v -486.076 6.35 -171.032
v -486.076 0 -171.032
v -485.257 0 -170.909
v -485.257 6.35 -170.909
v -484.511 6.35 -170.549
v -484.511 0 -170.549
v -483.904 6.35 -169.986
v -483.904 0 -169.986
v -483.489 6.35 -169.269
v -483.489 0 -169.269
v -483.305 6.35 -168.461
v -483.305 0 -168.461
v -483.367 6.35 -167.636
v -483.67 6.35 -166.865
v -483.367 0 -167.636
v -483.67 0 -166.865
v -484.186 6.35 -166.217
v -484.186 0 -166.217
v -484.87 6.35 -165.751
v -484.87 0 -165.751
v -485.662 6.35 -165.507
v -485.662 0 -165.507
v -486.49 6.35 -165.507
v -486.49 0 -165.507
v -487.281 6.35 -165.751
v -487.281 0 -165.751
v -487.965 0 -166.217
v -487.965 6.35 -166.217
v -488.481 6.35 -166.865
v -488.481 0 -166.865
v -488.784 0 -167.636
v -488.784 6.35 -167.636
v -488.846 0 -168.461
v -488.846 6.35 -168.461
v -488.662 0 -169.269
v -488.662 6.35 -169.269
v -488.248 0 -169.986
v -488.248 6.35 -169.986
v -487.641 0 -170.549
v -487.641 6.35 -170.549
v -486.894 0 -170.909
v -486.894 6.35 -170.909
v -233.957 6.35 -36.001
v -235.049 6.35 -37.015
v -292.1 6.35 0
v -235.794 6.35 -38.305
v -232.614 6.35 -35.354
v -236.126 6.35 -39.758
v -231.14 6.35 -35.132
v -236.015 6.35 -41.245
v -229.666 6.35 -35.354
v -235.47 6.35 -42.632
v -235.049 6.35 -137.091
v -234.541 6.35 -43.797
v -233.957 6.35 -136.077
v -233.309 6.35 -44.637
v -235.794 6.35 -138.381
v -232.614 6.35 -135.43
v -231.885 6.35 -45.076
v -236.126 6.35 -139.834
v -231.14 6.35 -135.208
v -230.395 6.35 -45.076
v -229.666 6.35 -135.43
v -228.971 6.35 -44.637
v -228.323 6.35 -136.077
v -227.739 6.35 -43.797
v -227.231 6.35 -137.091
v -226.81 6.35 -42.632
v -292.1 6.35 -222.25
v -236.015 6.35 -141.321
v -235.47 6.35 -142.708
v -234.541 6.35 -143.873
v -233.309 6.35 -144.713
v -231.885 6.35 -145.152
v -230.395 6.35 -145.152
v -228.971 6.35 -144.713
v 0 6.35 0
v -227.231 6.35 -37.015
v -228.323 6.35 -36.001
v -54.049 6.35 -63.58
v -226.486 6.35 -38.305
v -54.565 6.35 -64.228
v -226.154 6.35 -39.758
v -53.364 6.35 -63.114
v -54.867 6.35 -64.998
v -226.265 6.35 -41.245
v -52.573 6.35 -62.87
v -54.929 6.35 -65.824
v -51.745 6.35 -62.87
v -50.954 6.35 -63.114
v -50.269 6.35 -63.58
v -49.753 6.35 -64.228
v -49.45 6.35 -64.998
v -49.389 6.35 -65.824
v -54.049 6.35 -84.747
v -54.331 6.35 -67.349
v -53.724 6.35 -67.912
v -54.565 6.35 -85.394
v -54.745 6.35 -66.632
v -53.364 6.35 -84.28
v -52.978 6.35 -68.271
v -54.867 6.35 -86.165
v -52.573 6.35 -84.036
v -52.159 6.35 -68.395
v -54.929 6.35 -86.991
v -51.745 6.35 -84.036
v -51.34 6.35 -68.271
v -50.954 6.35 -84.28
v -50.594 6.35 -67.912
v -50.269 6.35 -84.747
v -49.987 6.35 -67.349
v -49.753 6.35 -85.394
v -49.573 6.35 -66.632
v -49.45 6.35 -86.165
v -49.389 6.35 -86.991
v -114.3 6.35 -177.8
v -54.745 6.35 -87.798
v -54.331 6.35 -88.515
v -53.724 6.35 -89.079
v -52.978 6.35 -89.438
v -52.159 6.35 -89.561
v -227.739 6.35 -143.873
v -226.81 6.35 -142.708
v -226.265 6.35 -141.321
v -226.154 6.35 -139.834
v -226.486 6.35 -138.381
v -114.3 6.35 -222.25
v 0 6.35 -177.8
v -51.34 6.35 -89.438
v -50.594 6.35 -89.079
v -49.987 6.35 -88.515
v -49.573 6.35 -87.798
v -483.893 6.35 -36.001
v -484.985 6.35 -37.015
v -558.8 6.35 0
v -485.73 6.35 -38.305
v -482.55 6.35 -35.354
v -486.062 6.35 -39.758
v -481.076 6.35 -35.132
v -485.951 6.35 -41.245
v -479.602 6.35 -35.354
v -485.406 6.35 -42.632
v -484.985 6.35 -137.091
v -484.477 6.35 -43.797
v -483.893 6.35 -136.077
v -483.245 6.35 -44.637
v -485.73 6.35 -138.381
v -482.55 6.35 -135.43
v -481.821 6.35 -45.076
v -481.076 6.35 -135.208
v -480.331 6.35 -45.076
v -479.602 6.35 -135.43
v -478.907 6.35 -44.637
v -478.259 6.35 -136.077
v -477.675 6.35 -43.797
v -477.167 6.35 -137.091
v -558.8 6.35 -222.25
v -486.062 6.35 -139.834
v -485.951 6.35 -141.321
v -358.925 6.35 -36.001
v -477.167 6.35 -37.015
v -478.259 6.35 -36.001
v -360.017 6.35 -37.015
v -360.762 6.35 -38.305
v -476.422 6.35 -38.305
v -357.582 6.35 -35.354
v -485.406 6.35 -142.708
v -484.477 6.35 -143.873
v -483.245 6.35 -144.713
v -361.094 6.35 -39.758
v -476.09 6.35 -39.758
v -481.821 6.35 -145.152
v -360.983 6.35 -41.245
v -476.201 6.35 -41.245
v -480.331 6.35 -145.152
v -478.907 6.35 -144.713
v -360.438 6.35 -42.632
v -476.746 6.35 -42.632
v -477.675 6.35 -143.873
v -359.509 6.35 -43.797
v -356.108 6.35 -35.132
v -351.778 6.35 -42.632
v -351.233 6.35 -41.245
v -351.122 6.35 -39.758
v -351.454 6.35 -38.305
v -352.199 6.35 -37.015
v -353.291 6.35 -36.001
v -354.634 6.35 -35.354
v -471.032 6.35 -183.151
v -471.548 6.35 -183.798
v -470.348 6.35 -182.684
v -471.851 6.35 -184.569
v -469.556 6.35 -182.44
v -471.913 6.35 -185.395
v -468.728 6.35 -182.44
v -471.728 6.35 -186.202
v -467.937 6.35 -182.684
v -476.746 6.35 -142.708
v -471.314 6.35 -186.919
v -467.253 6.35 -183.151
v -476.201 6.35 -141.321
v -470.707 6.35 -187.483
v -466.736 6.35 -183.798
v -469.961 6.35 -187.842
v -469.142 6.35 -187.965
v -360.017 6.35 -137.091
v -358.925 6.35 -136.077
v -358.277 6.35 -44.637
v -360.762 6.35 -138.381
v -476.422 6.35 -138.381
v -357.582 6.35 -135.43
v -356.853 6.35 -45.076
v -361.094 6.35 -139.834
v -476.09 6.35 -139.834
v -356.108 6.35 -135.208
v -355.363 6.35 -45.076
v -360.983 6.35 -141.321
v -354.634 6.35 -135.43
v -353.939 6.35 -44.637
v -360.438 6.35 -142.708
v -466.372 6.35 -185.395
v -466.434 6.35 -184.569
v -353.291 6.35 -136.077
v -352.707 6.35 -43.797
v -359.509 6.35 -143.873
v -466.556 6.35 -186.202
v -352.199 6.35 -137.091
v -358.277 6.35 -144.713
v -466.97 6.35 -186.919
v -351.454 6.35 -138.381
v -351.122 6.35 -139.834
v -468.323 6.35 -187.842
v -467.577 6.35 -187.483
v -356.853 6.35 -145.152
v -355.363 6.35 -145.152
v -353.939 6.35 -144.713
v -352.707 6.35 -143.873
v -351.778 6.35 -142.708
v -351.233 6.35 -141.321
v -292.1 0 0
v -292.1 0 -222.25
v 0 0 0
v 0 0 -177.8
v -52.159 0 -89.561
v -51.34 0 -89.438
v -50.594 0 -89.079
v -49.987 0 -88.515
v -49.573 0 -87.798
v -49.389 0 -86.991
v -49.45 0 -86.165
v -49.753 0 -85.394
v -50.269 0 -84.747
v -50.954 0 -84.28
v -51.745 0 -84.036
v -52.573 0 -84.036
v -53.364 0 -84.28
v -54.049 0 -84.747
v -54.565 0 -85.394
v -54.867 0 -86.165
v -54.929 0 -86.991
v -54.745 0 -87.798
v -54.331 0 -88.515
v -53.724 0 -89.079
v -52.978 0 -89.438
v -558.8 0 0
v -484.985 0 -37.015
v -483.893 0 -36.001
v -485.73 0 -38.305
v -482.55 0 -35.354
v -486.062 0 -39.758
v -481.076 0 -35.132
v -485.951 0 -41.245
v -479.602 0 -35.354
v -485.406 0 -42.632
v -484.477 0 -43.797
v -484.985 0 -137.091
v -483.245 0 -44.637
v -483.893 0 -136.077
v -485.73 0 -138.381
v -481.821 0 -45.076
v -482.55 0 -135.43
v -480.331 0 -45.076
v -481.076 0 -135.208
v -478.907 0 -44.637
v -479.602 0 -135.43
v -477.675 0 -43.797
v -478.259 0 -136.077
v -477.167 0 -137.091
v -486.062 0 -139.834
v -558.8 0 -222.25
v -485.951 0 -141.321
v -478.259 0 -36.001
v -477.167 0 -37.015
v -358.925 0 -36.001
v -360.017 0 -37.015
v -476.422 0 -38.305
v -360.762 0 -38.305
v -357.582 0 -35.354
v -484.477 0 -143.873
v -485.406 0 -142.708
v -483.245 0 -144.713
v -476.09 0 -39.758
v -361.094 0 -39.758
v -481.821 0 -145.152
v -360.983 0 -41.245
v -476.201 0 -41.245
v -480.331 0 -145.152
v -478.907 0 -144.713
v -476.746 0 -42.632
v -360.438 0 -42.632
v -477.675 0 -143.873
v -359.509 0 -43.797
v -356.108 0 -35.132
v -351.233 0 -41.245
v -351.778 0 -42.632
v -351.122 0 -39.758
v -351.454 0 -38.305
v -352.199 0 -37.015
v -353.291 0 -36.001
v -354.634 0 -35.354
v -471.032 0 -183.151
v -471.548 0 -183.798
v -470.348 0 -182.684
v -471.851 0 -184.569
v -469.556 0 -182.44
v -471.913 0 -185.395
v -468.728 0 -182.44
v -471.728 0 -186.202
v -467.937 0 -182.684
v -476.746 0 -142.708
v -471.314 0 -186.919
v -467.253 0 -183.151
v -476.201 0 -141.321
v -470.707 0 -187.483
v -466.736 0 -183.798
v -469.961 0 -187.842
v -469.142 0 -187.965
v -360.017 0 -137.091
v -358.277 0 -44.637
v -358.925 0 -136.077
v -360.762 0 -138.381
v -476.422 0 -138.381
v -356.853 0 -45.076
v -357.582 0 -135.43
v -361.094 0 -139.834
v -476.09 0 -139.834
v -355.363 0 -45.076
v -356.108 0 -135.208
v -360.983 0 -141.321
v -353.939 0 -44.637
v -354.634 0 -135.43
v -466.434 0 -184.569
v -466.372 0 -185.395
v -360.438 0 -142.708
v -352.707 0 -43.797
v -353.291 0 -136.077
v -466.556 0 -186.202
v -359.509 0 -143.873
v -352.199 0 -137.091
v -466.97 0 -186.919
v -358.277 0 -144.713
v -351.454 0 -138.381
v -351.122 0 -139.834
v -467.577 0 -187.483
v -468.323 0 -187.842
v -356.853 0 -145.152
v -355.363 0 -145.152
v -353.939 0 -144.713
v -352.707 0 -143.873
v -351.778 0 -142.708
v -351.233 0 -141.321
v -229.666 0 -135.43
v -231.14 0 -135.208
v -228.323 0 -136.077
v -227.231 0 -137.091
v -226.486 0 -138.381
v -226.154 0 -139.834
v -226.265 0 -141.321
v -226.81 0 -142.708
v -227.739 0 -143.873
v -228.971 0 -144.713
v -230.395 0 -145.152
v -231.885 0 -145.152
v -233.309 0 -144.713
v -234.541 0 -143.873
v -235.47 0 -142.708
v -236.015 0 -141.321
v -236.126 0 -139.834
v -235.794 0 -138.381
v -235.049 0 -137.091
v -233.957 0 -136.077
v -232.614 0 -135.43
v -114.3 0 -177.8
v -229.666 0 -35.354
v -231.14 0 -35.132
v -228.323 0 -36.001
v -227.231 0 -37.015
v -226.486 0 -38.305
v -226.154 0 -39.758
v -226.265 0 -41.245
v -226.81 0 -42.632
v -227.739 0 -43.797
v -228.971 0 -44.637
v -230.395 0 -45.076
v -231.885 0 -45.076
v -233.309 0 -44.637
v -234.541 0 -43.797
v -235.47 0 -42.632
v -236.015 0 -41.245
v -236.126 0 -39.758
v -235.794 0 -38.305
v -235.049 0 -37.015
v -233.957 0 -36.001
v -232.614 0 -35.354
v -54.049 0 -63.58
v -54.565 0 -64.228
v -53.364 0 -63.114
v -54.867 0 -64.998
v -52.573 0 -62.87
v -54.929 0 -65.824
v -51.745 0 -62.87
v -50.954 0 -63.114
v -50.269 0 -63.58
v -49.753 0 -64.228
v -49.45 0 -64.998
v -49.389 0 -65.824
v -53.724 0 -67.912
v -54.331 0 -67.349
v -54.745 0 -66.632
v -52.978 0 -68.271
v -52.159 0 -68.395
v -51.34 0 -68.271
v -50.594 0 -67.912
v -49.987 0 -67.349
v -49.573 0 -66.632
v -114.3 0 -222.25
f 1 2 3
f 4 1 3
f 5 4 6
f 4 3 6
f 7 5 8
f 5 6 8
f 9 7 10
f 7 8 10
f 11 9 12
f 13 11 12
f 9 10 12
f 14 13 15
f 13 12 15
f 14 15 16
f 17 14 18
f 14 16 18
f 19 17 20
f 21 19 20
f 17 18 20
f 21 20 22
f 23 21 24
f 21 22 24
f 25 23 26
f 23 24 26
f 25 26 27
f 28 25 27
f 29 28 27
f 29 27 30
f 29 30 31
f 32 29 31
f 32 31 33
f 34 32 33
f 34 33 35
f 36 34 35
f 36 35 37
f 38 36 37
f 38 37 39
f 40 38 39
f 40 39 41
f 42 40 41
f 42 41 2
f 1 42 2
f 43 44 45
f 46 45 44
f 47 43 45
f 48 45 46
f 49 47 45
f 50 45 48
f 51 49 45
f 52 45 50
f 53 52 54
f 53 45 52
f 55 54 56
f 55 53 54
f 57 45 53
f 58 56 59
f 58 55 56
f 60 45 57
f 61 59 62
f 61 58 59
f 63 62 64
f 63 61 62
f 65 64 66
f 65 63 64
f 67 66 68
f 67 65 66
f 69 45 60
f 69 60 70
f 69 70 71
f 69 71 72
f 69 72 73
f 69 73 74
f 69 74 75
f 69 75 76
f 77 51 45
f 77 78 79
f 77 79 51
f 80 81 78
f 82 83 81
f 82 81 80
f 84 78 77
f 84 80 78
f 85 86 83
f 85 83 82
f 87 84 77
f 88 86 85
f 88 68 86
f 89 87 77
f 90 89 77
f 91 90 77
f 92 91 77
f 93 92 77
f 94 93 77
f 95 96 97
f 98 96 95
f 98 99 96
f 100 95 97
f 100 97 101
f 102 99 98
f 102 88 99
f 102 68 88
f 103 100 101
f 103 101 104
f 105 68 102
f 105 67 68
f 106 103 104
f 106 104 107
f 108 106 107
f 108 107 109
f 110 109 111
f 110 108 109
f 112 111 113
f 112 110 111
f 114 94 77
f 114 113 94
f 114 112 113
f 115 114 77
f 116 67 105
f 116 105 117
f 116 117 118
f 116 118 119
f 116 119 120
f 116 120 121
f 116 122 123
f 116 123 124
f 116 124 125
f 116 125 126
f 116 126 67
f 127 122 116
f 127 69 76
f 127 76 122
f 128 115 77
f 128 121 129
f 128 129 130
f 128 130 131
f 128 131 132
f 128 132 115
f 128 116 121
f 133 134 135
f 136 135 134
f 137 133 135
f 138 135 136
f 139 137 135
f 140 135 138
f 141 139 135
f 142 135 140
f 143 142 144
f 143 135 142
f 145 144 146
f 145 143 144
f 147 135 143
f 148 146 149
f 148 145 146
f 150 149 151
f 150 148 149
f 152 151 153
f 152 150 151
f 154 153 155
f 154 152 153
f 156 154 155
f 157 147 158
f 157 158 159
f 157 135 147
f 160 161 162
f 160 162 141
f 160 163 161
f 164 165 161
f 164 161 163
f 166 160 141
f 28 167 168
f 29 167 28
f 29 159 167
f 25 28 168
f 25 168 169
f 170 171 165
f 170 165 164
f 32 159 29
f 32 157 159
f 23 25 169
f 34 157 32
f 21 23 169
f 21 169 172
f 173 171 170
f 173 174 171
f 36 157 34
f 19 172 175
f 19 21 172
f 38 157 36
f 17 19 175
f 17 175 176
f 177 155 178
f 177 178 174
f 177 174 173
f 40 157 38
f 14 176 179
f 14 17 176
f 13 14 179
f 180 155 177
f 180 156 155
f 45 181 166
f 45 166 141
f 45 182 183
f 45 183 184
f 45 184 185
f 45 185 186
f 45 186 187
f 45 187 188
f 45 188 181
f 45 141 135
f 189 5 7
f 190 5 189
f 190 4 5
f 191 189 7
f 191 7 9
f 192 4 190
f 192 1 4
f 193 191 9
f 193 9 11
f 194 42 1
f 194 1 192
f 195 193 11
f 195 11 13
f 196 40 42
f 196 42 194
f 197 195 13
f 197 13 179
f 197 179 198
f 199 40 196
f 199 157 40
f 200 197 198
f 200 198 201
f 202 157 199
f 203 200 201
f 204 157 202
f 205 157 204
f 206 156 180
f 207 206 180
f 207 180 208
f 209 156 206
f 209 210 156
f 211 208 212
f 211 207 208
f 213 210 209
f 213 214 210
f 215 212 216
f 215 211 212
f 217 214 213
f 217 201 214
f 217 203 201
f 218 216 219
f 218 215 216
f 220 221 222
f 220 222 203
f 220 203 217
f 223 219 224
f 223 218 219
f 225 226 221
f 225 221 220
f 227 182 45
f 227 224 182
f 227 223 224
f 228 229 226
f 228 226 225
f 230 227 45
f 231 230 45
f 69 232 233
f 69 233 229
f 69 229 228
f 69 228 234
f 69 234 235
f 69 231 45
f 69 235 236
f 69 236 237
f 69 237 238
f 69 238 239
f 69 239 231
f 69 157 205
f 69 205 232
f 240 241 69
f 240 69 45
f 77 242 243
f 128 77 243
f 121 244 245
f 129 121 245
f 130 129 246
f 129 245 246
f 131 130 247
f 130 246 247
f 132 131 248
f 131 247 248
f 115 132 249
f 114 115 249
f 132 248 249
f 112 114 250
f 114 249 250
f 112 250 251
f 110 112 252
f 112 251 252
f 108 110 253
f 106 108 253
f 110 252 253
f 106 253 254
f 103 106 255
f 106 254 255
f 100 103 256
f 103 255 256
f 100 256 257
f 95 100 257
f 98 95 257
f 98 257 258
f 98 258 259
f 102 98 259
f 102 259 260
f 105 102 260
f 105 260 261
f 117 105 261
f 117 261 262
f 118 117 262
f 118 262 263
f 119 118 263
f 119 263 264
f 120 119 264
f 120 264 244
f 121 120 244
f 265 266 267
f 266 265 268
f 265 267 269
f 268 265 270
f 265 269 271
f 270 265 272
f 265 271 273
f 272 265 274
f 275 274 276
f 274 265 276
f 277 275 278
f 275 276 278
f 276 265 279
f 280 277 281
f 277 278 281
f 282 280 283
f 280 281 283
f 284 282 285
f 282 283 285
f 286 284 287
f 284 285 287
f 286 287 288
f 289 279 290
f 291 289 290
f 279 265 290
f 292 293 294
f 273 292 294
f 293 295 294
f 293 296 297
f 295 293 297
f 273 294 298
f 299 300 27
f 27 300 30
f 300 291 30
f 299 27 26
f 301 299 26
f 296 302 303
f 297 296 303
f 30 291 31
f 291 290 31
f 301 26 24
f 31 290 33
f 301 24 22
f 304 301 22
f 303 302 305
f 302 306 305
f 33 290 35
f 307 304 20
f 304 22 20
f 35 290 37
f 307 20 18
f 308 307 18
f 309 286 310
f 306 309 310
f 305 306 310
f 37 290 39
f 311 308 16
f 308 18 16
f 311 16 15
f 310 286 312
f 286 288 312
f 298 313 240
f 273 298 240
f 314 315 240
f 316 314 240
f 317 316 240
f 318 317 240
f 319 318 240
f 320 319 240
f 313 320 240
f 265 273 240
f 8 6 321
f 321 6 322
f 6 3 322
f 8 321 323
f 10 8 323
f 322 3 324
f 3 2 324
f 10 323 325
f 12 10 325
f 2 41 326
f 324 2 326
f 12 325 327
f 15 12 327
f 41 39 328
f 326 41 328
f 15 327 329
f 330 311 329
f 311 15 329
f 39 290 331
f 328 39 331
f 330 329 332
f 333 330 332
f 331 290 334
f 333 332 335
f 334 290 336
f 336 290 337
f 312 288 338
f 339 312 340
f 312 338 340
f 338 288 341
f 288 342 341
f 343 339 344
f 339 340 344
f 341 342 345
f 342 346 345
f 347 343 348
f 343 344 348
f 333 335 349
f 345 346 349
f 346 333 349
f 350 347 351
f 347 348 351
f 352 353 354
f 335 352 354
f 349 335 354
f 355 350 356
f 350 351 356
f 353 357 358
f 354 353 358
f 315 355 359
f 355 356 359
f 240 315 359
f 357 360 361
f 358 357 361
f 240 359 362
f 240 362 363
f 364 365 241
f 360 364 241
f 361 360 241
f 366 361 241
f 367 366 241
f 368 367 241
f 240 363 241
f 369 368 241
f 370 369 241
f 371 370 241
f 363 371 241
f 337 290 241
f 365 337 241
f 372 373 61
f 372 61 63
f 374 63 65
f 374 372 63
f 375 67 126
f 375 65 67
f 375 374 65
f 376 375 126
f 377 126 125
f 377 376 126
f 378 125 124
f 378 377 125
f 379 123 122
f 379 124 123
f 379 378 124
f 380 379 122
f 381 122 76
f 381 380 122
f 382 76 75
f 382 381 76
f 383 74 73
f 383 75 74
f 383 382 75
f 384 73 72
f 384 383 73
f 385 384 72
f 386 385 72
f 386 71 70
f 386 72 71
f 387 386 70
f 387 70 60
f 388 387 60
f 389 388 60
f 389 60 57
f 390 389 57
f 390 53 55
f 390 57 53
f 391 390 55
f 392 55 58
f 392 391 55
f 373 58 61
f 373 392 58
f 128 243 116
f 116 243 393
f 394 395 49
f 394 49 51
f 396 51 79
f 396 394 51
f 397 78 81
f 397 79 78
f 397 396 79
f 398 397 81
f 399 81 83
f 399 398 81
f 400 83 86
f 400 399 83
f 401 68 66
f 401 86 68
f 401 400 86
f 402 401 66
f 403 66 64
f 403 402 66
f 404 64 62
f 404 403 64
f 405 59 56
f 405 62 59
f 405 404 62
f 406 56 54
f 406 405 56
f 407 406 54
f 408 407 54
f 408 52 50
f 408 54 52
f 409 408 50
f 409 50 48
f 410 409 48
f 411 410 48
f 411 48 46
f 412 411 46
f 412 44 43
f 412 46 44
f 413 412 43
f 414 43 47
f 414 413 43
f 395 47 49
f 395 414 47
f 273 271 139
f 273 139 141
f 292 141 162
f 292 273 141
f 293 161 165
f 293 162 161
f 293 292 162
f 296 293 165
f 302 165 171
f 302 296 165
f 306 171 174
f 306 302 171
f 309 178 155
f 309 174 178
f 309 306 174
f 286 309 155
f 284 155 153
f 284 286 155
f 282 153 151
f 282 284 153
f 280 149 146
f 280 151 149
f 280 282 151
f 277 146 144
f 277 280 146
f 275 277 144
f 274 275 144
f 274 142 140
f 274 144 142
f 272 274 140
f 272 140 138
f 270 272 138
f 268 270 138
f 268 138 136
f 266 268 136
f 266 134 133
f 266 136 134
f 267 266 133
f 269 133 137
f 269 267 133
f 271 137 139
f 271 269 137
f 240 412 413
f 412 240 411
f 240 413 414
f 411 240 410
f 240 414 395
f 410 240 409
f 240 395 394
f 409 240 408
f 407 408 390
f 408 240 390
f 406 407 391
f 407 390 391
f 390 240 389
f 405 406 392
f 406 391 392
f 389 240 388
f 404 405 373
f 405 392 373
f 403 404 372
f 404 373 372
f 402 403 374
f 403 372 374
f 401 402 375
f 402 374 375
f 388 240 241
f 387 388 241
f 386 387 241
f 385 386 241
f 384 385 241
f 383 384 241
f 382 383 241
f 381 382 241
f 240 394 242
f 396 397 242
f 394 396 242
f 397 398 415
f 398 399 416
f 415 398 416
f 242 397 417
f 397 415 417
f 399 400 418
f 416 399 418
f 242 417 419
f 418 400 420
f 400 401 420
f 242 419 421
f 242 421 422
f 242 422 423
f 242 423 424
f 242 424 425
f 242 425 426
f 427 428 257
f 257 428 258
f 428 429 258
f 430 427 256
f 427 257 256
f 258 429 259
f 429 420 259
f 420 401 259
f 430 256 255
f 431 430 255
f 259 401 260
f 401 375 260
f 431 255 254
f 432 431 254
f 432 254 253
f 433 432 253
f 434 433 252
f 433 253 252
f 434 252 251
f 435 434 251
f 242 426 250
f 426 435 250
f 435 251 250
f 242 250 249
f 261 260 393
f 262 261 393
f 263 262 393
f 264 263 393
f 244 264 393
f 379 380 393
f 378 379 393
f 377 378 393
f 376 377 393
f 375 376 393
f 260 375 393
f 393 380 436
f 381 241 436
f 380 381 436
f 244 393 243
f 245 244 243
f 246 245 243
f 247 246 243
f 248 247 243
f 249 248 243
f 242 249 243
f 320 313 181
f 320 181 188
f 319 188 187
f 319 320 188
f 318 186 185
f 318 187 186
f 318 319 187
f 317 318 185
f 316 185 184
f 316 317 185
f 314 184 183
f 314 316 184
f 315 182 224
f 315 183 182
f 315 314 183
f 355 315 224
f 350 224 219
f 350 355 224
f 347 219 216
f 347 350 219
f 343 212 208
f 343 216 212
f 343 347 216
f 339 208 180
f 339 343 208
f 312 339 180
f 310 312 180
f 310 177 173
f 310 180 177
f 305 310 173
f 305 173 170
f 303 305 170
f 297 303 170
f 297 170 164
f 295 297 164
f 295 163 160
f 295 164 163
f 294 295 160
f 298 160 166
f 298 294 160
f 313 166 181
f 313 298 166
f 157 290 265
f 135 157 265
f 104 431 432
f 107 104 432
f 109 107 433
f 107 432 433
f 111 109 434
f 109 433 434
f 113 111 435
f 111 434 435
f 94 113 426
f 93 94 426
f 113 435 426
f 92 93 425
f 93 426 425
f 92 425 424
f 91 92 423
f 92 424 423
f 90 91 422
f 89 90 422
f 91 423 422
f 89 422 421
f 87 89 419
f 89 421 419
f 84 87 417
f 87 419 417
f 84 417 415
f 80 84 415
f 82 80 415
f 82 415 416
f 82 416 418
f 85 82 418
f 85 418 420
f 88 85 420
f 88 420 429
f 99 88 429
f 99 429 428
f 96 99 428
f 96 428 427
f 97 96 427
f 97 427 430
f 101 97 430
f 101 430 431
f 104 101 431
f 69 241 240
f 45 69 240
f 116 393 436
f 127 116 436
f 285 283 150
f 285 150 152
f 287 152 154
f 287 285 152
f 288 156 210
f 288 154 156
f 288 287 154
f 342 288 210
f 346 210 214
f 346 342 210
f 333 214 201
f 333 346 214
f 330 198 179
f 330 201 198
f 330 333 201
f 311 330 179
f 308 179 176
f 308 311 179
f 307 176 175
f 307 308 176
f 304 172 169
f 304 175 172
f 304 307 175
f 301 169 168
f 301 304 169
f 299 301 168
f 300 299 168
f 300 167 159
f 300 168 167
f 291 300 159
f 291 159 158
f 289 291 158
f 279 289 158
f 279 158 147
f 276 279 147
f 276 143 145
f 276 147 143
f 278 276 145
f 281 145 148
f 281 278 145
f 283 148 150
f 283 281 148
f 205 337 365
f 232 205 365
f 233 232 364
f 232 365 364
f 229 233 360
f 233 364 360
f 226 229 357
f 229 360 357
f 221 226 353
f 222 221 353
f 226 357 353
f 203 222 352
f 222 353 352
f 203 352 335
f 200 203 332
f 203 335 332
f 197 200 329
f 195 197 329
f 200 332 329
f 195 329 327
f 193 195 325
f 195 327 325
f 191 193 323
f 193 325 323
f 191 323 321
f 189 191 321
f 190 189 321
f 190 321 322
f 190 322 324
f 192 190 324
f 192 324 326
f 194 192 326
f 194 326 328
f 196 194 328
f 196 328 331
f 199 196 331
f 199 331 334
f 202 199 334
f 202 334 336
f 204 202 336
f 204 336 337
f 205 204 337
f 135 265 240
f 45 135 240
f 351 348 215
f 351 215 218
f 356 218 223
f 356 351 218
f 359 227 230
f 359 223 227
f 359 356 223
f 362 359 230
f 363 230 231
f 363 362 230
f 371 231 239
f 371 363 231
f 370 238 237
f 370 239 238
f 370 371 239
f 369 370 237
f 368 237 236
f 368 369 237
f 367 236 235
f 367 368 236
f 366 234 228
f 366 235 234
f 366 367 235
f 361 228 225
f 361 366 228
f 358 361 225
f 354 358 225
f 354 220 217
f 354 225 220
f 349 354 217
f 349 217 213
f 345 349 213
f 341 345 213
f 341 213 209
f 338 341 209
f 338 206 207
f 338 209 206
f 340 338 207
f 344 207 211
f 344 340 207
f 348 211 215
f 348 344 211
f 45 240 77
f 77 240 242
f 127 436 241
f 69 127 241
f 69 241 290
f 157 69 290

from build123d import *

# Parameters (mm, degrees)
BOSS_EXTRUDE1_DEPTH     = 6.35
CUT_EXTRUDE3_DEPTH      = 602.409033022
CUT_EXTRUDE3_DEPTH_BACK = 602.409033022
SKETCH10_R              = 5.0000027
SKETCH2_R               = 2.778125
CUT_EXTRUDE4_DEPTH      = 602.409033022
SPLIT1_SURFACE_1_BACK   = 602.409
SPLIT1_SURFACE_1_DEPTH  = 1204.818
SPLIT1_SURFACE_2_BACK   = 602.409
SPLIT1_SURFACE_2_DEPTH  = 1204.818


with BuildPart() as part:
    # Sketch1 → Boss-Extrude1 (new body)
    with BuildSketch(Plane(origin=(0, 0, 0), x_dir=(1, 0, 0), z_dir=(0, 1, 0))):
        Polygon((0, 0), (0, 177.8), (-114.3, 177.8), (-114.3, 222.25), (-558.8, 222.25), (-558.8, 0), align=None)
    extrude(amount=BOSS_EXTRUDE1_DEPTH)

    # Sketch10 → Cut-Extrude3 (cut, two sides: drawn at the far end of the back side and taken through both)
    with BuildSketch(Plane(origin=(0, 6.35, 0), x_dir=(1, 0, 0), z_dir=(0, 1, 0)).offset(-CUT_EXTRUDE3_DEPTH_BACK)):
        with Locations(Location((-481.076, 40.132, 0), (0, 0, 270))):
            Circle(SKETCH10_R)
        with Locations(Location((-356.108, 40.132, 0), (0, 0, 270))):
            Circle(SKETCH10_R)
        with Locations(Location((-231.14, 40.132, 0), (0, 0, 270))):
            Circle(SKETCH10_R)
        with Locations(Location((-356.108, 140.208, 0), (0, 0, 270))):
            Circle(SKETCH10_R)
        with Locations(Location((-231.14, 140.208, 0), (0, 0, 270))):
            Circle(SKETCH10_R)
        with Locations(Location((-481.076, 140.208, 0), (0, 0, 270))):
            Circle(SKETCH10_R)
    extrude(amount=CUT_EXTRUDE3_DEPTH + CUT_EXTRUDE3_DEPTH_BACK, mode=Mode.SUBTRACT)

    # Sketch2 → Cut-Extrude4 (cut, through all)
    with BuildSketch(Plane.XZ):
        with Locations(Location((-52.1589, -86.783333333, 0), (0, 0, 270))):
            Circle(SKETCH2_R)
        with Locations(Location((-52.1589, -65.616666667, 0), (0, 0, 270))):
            Circle(SKETCH2_R)
        with Locations(Location((-469.142233333, -185.187166667, 0), (0, 0, 270))):
            Circle(SKETCH2_R)
        with Locations(Location((-486.075566667, -168.253833333, 0), (0, 0, 270))):
            Circle(SKETCH2_R)
    extrude(amount=-CUT_EXTRUDE4_DEPTH, mode=Mode.SUBTRACT)


with BuildPart() as body_2:
    # Split1: the piece behind the surface
    add(part.part)
    # Split1 surface: a surface, the sketch's curves swept straight by 1204.818 mm
    with BuildLine(Plane(origin=(0, 6.35, 0), x_dir=(1, 0, 0), z_dir=(0, 1, 0)).offset(-SPLIT1_SURFACE_1_BACK), mode=Mode.PRIVATE) as split1_surface_1_path:
        Line((-292.1, 222.25), (-292.1, 0))
    split1_surface_1 = Shell.extrude(split1_surface_1_path.wire(), (0 * SPLIT1_SURFACE_1_DEPTH, 1 * SPLIT1_SURFACE_1_DEPTH, 0 * SPLIT1_SURFACE_1_DEPTH))
    split(bisect_by=split1_surface_1, keep=Keep.BOTTOM)


with BuildPart() as part_1:
    add(part.part)

    # Split1: split by a surface, the side it looks to stays
    # Split1 surface: a surface, the sketch's curves swept straight by 1204.818 mm
    with BuildLine(Plane(origin=(0, 6.35, 0), x_dir=(1, 0, 0), z_dir=(0, 1, 0)).offset(-SPLIT1_SURFACE_2_BACK), mode=Mode.PRIVATE) as split1_surface_2_path:
        Line((-292.1, 222.25), (-292.1, 0))
    split1_surface_2 = Shell.extrude(split1_surface_2_path.wire(), (0 * SPLIT1_SURFACE_2_DEPTH, 1 * SPLIT1_SURFACE_2_DEPTH, 0 * SPLIT1_SURFACE_2_DEPTH))
    split(bisect_by=split1_surface_2, keep=Keep.TOP)


solid = Compound([body_2.part, part_1.part])
